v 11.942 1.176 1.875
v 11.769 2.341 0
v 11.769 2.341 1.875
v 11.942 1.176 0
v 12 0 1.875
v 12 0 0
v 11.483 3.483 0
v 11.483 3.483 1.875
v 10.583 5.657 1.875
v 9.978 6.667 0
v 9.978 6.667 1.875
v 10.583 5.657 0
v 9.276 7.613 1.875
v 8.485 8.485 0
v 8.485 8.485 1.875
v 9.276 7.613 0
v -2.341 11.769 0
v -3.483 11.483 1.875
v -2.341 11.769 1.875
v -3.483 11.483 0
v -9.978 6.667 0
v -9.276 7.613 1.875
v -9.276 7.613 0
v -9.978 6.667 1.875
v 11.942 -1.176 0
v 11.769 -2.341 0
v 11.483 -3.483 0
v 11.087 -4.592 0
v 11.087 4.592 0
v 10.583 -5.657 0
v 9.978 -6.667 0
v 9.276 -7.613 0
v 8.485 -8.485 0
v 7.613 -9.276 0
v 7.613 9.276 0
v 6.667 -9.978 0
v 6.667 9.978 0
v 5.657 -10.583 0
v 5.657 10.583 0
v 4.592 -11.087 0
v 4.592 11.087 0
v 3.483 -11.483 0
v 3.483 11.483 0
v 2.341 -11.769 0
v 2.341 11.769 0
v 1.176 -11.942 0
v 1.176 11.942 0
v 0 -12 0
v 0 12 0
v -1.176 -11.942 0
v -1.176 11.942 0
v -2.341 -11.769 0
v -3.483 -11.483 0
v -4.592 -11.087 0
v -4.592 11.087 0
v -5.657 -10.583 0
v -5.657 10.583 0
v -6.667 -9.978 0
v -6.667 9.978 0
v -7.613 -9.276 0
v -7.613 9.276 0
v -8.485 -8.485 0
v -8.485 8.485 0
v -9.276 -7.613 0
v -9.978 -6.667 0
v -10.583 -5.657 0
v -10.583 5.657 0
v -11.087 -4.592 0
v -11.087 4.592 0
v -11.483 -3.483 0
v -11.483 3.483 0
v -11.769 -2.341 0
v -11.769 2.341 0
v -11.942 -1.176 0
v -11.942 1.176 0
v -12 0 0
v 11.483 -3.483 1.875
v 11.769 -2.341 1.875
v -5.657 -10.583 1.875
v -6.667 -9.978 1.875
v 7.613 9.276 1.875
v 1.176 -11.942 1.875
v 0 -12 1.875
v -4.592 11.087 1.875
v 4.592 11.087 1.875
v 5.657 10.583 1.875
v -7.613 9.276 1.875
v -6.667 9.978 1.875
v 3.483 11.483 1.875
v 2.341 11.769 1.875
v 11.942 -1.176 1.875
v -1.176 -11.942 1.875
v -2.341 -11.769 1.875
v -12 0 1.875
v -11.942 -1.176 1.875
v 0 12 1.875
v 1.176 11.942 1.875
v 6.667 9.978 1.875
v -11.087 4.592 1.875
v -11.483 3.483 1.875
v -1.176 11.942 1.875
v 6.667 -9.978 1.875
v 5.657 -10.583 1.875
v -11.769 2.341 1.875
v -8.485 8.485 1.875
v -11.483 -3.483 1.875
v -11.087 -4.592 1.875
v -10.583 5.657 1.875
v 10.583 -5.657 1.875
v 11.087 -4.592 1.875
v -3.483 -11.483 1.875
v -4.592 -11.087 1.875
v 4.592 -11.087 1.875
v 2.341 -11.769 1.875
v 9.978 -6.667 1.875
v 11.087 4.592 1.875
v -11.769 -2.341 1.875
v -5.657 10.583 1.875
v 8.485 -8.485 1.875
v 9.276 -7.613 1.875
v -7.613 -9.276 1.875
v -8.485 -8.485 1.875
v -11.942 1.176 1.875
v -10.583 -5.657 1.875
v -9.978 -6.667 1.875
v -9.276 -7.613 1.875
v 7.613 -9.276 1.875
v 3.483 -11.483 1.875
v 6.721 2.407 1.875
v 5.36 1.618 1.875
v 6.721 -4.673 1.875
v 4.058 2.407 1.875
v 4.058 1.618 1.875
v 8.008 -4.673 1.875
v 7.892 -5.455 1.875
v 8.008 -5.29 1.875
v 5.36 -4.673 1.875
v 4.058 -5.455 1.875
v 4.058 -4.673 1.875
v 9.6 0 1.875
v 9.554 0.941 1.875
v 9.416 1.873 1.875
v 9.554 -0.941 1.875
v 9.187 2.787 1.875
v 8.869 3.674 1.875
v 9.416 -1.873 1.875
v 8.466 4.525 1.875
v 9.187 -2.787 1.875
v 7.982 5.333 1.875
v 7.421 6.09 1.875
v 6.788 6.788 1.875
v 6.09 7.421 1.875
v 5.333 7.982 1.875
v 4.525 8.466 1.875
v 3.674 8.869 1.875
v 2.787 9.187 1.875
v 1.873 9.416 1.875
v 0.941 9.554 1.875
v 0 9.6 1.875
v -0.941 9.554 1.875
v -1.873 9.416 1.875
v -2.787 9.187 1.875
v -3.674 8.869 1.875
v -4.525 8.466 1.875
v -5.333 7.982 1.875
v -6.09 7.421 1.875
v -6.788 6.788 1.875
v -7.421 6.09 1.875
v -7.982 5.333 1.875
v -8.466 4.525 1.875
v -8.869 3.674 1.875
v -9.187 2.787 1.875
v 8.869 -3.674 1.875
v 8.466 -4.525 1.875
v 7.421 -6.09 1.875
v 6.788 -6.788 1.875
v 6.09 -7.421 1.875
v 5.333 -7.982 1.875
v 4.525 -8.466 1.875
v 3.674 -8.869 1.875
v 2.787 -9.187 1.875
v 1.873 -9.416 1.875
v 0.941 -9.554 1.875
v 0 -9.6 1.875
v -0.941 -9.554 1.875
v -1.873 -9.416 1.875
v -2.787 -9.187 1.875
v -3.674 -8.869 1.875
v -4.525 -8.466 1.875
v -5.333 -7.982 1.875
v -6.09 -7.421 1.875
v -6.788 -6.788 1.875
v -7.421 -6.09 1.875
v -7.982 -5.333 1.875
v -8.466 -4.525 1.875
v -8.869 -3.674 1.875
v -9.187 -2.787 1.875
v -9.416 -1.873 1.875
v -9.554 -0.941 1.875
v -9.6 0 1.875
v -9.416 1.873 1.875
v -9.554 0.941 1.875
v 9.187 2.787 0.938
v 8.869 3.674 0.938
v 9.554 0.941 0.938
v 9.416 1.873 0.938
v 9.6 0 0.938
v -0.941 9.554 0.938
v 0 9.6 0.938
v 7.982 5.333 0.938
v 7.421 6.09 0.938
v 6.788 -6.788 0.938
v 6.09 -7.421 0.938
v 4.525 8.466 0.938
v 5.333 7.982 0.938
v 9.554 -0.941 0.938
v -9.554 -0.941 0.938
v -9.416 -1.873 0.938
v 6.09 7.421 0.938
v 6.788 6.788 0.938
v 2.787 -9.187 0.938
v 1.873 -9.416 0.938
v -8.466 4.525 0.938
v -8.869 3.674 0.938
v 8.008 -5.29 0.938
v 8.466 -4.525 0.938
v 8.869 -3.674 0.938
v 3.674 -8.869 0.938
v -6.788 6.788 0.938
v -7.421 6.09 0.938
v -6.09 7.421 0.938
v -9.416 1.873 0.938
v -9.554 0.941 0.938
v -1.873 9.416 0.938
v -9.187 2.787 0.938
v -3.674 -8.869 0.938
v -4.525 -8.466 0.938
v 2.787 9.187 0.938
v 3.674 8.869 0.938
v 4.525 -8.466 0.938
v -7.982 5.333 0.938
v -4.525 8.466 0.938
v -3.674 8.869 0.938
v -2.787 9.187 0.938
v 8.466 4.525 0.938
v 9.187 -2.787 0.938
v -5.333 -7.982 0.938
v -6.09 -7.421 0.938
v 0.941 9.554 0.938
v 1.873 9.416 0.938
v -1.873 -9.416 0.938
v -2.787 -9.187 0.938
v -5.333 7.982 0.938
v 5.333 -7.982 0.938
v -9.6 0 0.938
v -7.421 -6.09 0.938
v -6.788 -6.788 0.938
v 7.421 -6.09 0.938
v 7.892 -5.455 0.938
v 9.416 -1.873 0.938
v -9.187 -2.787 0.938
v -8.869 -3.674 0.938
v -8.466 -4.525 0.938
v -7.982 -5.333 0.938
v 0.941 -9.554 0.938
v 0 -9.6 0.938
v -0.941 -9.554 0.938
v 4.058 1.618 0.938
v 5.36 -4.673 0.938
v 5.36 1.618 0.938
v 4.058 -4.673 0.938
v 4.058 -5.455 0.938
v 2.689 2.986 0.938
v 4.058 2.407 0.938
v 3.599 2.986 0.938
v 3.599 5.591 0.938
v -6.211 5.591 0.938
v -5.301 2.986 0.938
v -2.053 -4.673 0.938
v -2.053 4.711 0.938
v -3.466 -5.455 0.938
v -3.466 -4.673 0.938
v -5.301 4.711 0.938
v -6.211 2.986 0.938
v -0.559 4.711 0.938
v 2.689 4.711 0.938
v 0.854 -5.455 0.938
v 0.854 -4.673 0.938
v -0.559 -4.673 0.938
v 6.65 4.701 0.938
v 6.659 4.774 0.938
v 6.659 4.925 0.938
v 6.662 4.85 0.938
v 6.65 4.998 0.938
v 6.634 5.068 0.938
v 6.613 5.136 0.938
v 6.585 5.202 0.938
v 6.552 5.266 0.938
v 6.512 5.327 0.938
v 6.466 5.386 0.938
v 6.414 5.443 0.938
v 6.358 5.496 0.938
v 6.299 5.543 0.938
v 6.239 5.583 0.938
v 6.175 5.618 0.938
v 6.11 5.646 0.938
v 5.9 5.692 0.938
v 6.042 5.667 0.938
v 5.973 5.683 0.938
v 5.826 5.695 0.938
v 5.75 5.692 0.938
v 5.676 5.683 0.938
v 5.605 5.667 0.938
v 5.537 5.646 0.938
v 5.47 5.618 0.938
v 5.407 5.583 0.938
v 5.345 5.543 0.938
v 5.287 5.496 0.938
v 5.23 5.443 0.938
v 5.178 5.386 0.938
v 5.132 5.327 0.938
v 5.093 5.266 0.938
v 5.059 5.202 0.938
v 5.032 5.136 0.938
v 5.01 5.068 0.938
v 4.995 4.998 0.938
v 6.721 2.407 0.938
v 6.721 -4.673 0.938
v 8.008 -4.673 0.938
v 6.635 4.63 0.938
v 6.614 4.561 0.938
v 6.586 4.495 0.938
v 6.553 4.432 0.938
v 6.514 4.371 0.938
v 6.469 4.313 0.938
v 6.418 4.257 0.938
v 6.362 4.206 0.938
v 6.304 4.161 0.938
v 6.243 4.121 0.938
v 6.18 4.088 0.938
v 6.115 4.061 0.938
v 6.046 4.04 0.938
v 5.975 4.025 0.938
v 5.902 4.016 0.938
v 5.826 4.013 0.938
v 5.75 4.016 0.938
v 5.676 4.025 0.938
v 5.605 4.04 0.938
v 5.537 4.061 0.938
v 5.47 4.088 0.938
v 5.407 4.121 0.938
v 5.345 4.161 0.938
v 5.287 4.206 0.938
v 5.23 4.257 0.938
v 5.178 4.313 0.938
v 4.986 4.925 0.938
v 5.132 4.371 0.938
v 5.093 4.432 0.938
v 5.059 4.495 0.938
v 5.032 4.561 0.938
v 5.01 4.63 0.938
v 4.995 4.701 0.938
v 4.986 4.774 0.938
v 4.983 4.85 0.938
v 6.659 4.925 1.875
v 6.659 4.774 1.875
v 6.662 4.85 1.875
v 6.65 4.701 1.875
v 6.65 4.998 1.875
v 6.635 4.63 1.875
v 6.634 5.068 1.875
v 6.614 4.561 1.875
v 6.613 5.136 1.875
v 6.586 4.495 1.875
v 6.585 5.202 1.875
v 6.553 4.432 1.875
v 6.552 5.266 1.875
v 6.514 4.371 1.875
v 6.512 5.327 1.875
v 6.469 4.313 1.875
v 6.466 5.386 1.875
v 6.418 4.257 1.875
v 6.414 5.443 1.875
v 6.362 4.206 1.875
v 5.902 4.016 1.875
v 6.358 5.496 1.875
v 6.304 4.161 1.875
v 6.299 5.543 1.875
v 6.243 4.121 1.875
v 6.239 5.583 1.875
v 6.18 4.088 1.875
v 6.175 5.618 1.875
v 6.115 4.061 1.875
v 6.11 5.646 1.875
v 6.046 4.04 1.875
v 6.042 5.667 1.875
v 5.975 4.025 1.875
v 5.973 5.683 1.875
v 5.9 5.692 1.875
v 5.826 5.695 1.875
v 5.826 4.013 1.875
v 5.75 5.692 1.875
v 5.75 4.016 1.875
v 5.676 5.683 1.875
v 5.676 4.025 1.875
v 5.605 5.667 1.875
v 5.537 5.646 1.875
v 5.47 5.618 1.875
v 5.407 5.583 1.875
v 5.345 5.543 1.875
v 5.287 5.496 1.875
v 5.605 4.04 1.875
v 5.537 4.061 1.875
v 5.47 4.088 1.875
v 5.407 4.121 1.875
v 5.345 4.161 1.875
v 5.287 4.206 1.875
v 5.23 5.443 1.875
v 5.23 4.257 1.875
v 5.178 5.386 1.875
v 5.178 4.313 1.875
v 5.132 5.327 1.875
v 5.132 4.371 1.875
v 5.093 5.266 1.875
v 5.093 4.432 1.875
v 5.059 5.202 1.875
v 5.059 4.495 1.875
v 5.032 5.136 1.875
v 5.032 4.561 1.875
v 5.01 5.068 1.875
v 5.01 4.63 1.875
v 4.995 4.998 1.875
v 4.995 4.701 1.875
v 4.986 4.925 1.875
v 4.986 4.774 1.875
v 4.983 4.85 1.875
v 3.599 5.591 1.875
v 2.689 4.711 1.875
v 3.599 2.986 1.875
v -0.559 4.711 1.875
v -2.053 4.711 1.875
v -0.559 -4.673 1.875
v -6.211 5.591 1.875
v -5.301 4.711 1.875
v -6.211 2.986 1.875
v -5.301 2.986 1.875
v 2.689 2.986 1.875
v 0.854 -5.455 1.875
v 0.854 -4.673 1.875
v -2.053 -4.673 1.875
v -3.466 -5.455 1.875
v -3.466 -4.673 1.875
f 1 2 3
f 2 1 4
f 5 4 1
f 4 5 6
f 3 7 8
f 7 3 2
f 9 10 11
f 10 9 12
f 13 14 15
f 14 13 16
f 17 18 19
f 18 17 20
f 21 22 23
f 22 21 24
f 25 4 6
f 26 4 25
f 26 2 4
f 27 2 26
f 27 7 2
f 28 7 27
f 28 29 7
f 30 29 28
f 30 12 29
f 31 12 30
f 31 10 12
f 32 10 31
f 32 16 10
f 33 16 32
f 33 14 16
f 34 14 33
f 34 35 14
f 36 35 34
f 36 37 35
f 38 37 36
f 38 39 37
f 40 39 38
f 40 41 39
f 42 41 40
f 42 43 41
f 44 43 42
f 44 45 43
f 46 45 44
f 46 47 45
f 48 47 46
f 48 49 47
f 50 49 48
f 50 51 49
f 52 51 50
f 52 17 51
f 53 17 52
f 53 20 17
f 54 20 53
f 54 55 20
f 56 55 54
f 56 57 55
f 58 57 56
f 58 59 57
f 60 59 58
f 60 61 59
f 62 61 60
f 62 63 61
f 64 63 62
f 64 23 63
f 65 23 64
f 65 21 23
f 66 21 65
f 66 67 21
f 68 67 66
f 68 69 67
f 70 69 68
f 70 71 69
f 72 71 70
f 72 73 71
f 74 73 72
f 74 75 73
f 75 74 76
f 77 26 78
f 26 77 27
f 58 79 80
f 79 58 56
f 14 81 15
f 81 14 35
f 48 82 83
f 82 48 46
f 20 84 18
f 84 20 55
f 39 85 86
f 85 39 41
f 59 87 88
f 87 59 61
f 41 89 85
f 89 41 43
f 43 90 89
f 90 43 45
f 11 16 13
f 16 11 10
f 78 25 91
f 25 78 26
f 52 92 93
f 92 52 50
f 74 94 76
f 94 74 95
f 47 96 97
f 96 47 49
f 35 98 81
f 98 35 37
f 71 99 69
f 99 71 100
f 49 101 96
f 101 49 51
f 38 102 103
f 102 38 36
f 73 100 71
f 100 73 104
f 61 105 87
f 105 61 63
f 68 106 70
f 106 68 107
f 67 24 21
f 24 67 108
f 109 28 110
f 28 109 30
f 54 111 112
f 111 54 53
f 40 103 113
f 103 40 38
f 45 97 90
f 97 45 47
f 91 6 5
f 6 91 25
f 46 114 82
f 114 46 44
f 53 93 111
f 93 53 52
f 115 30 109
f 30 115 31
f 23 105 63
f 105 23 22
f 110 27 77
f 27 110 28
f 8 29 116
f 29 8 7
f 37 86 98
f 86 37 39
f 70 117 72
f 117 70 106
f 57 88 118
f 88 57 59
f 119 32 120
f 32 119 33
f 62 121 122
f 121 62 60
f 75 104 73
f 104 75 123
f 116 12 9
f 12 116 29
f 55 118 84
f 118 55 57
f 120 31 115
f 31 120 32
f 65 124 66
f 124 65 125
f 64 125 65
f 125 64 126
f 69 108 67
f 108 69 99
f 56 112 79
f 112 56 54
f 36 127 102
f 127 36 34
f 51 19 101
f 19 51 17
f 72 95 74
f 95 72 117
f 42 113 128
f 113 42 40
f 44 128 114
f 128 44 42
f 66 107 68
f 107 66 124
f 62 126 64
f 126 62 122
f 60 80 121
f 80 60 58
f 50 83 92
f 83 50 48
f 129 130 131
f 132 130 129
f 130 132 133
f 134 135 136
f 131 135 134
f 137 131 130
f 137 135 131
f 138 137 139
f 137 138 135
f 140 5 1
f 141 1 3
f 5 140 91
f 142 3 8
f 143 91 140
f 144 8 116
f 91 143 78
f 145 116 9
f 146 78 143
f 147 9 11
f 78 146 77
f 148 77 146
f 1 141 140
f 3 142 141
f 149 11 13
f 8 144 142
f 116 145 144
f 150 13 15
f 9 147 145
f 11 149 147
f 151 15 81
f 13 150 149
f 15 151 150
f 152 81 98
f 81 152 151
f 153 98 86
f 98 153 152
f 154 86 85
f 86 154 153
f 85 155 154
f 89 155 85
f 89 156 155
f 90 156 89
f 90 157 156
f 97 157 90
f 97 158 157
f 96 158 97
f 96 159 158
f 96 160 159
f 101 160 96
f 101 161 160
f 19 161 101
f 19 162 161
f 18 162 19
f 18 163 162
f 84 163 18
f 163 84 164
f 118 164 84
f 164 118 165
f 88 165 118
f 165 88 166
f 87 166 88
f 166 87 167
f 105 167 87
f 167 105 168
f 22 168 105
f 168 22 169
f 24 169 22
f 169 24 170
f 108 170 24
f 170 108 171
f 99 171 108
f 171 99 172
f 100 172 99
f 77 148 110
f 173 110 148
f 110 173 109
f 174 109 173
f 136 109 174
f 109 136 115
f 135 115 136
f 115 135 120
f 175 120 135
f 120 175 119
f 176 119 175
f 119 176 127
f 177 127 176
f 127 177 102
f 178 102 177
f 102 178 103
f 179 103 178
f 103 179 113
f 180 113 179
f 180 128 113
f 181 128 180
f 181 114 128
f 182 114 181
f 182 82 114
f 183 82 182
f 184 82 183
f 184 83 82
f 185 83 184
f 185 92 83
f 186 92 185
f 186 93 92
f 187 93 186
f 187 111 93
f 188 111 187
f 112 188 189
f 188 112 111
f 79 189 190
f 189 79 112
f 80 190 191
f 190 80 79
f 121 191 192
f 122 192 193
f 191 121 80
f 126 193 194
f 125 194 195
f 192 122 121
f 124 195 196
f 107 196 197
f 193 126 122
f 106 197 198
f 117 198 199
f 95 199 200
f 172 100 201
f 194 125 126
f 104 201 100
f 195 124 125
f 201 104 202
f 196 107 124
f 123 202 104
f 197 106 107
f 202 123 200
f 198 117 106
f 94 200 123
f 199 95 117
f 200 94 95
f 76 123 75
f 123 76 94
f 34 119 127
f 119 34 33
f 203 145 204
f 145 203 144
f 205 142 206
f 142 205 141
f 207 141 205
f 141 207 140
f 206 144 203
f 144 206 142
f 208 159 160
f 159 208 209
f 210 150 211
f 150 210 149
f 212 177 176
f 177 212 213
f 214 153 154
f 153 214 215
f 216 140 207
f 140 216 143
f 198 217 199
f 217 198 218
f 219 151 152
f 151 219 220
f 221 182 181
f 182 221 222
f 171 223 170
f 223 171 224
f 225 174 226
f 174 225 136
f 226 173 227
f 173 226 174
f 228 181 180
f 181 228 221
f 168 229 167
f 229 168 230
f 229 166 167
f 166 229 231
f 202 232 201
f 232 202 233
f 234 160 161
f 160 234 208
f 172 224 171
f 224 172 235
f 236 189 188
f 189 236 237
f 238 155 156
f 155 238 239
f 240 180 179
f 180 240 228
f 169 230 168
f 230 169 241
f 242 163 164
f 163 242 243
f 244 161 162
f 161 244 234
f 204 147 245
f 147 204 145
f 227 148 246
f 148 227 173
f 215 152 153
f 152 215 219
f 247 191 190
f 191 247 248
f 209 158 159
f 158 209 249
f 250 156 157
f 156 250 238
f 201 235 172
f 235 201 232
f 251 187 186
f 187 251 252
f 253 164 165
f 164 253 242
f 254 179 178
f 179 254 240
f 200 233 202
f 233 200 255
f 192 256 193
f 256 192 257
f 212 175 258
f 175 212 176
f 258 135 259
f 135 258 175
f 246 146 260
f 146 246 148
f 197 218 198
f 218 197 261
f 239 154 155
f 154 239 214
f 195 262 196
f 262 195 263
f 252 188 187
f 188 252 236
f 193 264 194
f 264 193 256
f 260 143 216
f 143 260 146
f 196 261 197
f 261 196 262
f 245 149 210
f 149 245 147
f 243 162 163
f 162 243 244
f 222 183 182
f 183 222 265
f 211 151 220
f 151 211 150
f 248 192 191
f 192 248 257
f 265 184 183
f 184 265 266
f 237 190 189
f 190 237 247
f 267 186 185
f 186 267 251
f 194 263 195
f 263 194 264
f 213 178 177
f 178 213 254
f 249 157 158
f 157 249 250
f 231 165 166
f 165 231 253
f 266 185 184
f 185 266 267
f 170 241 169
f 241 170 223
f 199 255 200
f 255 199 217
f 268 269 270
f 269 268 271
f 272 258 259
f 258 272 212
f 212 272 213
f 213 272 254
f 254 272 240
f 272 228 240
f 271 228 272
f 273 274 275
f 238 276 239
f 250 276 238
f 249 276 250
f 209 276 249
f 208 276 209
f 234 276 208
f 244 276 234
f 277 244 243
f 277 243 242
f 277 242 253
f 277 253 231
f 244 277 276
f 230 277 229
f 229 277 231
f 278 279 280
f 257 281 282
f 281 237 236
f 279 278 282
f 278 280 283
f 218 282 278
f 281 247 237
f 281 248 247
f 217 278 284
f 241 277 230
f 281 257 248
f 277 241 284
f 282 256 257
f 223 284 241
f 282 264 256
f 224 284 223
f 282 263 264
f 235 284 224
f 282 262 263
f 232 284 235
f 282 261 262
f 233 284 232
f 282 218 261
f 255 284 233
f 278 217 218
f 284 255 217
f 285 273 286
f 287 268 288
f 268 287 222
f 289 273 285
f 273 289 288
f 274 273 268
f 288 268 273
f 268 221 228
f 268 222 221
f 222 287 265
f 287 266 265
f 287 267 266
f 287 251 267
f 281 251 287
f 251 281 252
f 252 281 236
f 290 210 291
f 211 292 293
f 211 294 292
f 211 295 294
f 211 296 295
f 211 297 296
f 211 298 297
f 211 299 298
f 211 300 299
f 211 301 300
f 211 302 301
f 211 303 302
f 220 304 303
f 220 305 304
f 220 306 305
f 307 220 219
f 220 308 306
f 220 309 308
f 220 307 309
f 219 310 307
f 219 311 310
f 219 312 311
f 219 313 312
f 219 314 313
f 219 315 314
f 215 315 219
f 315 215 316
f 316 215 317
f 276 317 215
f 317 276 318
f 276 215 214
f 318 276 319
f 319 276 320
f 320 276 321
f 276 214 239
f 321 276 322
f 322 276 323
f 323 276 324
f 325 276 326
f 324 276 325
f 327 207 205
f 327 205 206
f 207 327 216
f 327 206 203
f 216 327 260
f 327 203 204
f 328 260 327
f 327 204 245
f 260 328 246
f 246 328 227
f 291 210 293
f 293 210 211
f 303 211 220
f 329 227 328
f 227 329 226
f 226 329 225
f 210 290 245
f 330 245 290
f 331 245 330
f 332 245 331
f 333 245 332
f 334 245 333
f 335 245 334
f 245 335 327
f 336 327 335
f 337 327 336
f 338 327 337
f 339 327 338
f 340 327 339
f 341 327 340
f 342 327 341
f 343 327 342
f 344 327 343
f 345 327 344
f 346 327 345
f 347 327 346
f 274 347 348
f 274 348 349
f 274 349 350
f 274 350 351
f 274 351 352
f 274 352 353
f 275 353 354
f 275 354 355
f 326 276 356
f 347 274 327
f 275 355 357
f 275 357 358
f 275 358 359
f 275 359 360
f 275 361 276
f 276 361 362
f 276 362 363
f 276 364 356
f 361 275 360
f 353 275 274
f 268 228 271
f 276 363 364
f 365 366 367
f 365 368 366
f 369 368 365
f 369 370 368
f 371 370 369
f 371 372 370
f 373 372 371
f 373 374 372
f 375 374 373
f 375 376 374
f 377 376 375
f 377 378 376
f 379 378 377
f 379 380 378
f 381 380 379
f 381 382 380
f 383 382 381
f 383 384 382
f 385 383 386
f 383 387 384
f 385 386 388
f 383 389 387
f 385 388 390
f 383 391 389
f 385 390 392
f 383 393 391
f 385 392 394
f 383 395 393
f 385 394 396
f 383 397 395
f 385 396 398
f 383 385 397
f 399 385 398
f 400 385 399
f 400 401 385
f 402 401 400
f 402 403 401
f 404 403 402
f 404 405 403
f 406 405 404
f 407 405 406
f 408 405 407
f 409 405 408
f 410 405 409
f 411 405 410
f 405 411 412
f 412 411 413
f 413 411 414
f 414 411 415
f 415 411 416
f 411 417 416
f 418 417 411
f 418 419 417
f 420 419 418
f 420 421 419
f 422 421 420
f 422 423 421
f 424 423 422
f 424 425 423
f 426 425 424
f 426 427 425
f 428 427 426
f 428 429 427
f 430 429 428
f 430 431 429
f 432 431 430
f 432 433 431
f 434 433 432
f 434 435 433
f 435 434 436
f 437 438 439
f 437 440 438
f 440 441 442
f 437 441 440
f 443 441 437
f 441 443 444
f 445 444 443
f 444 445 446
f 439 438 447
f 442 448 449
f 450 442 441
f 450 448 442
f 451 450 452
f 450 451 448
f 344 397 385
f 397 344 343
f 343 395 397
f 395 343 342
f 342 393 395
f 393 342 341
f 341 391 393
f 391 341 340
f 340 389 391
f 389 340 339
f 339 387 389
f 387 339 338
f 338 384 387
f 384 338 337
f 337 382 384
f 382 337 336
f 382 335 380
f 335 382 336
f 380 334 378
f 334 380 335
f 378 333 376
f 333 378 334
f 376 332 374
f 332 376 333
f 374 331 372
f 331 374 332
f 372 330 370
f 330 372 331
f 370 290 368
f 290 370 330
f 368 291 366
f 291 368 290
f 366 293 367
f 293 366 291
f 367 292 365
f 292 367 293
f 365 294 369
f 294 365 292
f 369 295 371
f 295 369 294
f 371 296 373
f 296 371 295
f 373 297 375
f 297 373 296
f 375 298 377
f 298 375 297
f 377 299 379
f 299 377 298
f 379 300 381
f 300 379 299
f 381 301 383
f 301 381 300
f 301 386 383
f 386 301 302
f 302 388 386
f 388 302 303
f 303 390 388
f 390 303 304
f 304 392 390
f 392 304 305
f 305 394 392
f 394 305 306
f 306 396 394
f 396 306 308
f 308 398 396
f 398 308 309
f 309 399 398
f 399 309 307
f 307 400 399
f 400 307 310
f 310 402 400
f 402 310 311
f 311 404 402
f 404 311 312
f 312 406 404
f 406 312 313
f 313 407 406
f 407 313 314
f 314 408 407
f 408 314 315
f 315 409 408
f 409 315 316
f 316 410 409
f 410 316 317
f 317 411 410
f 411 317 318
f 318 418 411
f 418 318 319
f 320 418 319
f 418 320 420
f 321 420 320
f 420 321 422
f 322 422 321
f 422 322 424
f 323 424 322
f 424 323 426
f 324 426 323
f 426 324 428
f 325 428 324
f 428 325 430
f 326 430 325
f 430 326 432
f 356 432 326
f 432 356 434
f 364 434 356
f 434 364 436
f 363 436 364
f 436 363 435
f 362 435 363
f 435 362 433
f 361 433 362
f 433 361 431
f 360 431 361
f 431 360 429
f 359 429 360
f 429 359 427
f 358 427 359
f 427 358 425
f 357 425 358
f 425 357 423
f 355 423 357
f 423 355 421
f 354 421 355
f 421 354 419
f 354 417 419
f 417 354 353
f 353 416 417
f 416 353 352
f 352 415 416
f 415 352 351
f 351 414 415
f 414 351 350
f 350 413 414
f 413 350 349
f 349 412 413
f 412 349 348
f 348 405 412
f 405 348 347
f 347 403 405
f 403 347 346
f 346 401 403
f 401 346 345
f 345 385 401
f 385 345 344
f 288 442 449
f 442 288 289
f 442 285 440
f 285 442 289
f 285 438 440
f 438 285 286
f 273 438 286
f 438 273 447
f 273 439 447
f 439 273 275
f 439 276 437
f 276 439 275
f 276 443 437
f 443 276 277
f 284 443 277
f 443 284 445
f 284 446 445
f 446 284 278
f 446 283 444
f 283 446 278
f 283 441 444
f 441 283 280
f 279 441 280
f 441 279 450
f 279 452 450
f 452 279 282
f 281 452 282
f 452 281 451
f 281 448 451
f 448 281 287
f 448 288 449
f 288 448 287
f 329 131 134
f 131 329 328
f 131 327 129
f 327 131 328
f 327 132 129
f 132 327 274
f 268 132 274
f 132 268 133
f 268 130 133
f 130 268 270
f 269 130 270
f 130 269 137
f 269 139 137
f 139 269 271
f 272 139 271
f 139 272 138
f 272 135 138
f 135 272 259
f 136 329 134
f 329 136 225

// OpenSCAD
$fn = 64;

size_index = 120;
button_radius = size_index/10;
rim_size = size_index/100;
internal_radius = button_radius - rim_size*2;
//button_height = 1.8;
button_height = size_index/64;
button_drop = button_height/2;
font_size = size_index/11;

text = "Align";
 
difference() {
    cylinder(r = button_radius, h = button_height);
    translate([0, 0, button_drop]) {
        cylinder(r = internal_radius, h = button_drop);
    }
    
}


content = "Ti";
//font = "Liberation Sans";
//font = "Comic Sans"; 
font = "Palatino";

translate ([-(font_size/2.2)-1.4,-(font_size/2),0]) {
   linear_extrude(height = button_height) {
       text(content, font = font, size = font_size);
     }
 }
